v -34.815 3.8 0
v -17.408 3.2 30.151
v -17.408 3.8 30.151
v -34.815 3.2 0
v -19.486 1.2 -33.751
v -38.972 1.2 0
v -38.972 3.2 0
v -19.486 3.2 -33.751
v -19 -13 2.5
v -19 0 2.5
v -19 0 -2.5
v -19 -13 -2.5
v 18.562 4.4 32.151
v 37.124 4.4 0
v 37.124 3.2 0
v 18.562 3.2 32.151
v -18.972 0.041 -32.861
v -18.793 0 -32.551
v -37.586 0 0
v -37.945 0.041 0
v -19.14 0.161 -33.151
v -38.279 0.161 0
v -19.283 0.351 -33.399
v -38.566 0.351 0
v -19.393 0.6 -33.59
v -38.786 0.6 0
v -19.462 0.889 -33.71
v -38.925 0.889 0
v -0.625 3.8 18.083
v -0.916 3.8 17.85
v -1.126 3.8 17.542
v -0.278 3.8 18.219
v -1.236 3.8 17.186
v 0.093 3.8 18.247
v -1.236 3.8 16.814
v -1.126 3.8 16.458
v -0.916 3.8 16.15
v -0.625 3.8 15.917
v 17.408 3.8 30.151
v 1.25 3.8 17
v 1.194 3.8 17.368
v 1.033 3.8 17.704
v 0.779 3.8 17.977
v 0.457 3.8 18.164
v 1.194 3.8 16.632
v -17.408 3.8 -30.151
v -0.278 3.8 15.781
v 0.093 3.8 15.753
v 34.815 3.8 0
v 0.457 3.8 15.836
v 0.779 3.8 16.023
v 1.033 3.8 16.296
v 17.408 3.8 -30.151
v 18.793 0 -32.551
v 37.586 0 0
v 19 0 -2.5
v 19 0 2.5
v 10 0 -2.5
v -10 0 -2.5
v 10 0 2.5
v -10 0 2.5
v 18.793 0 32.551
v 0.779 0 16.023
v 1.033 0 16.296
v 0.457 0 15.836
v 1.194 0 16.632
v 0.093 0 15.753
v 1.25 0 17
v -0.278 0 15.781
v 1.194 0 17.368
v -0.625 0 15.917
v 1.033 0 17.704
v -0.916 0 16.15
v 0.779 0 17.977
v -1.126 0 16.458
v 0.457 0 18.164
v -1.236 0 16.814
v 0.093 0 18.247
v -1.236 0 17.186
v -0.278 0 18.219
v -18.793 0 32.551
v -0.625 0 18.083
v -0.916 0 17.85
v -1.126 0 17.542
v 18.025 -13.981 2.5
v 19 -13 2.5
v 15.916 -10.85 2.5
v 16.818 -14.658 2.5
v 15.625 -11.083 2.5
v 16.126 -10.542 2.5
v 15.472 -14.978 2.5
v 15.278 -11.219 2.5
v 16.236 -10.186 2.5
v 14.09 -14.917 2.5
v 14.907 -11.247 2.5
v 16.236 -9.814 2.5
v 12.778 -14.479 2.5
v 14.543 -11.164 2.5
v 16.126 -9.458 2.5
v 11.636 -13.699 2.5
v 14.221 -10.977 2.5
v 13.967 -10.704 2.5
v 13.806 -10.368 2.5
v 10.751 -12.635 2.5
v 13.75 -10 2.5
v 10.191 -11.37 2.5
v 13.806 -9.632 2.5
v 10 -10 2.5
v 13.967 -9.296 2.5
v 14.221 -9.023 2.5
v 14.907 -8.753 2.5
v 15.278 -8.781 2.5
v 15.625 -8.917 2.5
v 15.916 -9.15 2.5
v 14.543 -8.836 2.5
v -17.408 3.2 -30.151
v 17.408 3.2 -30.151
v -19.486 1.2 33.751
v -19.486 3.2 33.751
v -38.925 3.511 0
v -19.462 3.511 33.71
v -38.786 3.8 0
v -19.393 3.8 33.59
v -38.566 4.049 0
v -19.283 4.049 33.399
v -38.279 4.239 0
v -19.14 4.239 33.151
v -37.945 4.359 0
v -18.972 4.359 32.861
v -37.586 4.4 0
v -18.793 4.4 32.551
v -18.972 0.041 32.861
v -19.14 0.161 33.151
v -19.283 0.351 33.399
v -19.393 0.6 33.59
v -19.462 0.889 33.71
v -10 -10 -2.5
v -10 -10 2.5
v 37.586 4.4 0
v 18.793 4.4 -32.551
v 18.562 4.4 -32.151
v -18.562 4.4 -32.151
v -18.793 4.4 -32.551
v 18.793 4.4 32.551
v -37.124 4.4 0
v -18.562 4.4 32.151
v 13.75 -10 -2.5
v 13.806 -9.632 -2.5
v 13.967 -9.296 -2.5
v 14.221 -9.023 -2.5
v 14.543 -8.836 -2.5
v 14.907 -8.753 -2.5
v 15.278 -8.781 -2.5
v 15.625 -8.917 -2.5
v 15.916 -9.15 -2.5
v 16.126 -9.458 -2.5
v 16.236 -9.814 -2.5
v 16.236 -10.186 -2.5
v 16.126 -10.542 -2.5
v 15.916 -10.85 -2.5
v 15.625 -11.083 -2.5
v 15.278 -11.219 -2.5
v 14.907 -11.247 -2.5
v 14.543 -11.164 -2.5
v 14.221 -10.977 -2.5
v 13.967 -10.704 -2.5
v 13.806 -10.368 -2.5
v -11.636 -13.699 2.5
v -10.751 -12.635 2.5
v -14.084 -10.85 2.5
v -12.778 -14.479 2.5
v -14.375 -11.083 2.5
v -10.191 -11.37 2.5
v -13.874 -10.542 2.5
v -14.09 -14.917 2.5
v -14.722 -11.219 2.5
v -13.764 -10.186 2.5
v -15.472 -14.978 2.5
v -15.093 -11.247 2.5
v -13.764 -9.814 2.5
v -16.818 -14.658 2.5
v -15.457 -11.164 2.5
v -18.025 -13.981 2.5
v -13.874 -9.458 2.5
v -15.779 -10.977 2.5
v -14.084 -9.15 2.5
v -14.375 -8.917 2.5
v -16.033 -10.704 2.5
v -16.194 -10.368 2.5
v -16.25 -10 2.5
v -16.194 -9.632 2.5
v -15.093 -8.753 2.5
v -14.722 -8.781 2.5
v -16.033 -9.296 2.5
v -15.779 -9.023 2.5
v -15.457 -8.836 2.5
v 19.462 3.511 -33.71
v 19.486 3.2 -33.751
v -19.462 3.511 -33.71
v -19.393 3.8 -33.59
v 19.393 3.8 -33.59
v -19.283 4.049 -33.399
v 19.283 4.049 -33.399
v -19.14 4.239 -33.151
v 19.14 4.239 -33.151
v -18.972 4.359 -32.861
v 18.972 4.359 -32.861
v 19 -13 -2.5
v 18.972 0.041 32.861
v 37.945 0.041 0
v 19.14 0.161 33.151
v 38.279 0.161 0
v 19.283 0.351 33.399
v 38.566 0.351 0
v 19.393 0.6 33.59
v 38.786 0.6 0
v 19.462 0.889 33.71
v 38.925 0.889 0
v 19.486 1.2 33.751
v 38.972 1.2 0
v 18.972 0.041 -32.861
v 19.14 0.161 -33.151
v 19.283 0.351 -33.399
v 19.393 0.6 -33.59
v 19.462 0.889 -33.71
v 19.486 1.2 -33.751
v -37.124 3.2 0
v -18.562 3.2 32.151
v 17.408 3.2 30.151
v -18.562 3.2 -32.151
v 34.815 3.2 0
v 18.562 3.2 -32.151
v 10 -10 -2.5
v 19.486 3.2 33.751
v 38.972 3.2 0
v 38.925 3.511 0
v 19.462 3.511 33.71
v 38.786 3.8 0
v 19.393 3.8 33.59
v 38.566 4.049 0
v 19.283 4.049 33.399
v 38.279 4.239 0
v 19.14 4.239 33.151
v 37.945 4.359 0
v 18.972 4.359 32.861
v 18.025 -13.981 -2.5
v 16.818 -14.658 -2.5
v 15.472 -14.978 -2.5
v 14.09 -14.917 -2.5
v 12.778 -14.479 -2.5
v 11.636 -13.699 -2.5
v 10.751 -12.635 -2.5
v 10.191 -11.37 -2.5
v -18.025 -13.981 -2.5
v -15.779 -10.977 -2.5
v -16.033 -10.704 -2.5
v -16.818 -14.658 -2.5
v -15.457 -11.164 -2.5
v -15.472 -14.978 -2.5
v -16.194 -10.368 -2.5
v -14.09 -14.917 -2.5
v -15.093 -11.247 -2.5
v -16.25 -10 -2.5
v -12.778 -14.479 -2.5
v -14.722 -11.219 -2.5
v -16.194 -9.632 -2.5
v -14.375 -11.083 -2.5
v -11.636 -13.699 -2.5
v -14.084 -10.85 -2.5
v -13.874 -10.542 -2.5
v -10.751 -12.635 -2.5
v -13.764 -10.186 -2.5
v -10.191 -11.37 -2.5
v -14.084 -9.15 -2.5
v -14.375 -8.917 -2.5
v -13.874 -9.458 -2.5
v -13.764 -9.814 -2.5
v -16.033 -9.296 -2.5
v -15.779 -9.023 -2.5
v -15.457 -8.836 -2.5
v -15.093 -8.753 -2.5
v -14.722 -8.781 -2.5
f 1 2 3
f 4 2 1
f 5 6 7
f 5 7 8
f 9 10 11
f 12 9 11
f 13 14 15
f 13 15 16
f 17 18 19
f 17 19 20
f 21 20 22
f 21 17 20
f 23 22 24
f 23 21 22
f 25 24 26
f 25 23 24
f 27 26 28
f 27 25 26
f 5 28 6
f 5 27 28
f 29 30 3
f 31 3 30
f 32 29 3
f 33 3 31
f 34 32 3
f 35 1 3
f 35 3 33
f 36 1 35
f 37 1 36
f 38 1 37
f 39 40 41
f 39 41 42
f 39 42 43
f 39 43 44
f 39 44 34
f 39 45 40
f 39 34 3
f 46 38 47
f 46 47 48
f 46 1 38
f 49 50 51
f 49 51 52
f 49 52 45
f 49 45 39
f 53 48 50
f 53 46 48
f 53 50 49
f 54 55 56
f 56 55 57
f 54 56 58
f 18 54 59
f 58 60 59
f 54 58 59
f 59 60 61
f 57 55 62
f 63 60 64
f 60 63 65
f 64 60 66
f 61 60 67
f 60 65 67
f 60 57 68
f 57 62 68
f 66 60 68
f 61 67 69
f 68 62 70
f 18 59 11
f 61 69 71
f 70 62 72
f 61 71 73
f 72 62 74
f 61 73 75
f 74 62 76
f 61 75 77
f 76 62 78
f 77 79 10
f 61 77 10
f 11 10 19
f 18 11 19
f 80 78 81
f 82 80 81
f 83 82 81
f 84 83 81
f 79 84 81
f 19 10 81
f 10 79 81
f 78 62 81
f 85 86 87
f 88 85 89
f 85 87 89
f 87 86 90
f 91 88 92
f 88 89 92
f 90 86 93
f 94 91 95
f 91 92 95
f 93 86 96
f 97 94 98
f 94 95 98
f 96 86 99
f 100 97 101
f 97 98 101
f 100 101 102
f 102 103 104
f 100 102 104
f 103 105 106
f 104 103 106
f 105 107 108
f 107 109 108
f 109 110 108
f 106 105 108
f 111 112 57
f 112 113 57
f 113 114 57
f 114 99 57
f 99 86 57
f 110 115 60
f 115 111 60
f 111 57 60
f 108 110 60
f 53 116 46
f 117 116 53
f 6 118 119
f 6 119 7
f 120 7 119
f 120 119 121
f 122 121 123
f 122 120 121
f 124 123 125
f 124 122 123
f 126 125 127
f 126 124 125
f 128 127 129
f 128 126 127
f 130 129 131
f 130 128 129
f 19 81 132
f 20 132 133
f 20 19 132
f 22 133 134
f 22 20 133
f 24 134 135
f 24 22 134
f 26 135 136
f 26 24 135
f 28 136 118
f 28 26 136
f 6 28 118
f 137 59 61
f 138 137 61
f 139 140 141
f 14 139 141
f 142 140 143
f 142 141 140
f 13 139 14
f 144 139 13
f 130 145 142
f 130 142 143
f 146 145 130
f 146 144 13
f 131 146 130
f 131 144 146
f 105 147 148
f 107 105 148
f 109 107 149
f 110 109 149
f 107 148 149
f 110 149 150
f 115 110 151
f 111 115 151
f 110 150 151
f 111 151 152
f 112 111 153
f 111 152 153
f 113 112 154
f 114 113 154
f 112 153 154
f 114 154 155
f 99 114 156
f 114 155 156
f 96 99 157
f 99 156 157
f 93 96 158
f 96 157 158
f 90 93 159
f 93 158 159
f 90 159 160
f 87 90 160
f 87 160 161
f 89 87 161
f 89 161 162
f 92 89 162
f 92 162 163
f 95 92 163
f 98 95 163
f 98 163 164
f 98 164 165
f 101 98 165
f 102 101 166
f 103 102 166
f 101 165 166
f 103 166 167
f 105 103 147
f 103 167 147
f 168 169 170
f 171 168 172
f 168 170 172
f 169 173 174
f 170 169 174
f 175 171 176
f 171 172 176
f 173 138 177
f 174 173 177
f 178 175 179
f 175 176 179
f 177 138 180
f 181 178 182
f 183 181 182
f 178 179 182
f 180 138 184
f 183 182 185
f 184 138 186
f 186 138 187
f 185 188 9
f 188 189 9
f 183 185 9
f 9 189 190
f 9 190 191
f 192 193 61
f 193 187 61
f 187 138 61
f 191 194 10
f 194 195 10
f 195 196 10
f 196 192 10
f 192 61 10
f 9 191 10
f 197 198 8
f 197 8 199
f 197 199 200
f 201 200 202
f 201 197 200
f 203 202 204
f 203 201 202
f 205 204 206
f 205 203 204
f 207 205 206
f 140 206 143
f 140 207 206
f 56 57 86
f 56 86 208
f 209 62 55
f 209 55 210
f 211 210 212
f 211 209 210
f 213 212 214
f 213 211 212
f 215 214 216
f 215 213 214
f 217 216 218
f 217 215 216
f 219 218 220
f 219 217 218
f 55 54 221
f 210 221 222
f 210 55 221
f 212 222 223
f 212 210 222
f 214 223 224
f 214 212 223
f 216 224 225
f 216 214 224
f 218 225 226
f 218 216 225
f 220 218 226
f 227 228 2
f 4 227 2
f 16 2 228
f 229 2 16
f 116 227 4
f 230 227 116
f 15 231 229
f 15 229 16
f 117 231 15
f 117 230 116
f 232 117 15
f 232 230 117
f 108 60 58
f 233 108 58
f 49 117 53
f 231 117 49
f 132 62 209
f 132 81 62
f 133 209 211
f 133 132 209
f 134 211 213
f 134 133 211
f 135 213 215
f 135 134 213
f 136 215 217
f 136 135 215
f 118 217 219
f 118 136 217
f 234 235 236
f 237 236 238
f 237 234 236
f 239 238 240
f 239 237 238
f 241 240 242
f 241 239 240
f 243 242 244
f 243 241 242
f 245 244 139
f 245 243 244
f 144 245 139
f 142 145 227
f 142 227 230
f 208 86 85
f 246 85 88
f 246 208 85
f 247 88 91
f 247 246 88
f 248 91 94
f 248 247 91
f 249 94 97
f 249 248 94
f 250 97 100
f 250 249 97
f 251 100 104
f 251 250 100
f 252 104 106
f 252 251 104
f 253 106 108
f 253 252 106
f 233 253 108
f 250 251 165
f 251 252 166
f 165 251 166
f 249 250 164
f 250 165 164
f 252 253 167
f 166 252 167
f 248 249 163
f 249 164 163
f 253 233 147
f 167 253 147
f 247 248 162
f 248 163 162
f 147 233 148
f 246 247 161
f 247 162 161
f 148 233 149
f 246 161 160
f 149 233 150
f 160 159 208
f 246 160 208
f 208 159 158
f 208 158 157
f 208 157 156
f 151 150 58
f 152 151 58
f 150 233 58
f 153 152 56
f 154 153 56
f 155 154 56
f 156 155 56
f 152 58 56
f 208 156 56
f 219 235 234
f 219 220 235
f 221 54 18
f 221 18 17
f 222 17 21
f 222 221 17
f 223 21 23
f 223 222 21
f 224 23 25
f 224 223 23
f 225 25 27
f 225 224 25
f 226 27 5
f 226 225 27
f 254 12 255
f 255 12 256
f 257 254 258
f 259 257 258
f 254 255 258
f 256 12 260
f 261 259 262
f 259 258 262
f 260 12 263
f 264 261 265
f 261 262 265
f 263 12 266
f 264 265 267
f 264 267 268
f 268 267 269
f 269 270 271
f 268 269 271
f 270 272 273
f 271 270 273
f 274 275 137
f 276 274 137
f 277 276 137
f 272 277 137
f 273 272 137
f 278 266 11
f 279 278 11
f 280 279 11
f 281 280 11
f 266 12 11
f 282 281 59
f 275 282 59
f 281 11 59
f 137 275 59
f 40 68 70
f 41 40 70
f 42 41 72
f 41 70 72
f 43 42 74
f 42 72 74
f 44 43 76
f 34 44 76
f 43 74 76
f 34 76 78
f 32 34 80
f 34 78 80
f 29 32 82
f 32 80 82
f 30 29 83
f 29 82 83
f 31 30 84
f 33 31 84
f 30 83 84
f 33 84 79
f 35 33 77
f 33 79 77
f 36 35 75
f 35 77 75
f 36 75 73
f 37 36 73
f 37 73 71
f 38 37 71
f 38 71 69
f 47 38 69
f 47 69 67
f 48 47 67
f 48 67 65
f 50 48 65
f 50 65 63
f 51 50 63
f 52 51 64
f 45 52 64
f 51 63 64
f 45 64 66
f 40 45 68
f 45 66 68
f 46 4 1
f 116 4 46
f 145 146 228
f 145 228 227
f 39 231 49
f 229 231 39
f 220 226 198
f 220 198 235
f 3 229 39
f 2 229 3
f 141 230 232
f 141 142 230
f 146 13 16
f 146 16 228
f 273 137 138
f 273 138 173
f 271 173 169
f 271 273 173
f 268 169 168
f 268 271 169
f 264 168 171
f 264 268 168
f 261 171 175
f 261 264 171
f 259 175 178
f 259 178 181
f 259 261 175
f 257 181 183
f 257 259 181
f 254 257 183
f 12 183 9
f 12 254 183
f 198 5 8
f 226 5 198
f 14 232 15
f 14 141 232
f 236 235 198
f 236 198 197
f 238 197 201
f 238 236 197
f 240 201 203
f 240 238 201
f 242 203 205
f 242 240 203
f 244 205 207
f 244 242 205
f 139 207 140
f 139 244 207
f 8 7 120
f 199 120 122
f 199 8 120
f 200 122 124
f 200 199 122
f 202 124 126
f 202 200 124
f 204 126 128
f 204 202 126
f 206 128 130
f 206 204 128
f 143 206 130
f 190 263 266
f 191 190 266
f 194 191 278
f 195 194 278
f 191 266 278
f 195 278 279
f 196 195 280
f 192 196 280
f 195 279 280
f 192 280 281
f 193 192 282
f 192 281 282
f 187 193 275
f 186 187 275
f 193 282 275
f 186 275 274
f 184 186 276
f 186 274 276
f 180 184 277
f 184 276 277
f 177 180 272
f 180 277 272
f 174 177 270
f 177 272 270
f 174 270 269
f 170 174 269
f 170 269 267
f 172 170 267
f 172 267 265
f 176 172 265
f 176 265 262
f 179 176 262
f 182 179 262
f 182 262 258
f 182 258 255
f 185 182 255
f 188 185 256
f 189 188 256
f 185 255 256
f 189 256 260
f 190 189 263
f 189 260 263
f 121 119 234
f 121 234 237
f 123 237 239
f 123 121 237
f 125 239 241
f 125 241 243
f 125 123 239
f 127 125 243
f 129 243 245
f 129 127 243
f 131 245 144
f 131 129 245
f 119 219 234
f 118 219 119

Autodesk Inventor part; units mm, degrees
ref_plane "YZ Plane" through (0, 0, 0) normal (1, 0, 0) x (0, 1, 0)
ref_plane "XZ Plane" through (0, 0, 0) normal (0, 1, 0) x (-1, 0, 0)
ref_plane "XY Plane" through (0, 0, 0) normal (0, 0, 1) x (1, 0, 0)
sketch "스케치1" plane through (0, 0, 0) normal (0, 1, 0) x (-1, 0, 0)
  line L0 (17.6385, -30.5508) -> (-17.6385, -30.5508)
  line L1 (-17.6385, -30.5508) -> (-35.277, 0)
  line L2 (-35.277, 0) -> (-17.6385, 30.5508)
  line L3 (-17.6385, 30.5508) -> (17.6385, 30.5508)
  line L4 (17.6385, 30.5508) -> (35.277, 0)
  line L5 (35.277, 0) -> (17.6385, -30.5508)
  line L6 (19.486, -33.7508) -> (-19.486, -33.7508)
  line L7 (-19.486, -33.7508) -> (-38.972, 0)
  line L8 (-38.972, 0) -> (-19.486, 33.7508)
  line L9 (-19.486, 33.7508) -> (19.486, 33.7508)
  line L10 (19.486, 33.7508) -> (38.972, 0)
  line L11 (38.972, 0) -> (19.486, -33.7508)
  point P0 (0, 0)
  point P1 (0, 0)
  point P2 (0, 0)
  dimension "d0" = 70.554
  dimension "d1" = 3.2
extrude "돌출1" add sketch "스케치1" along normal blind 4.4 contours L0 L1 L2 L3 L4 L5 | L6 L7 L8 L9 L10 L11
sketch "스케치2" plane through (0, 4.4, 0) normal (0, 1, 0) x (1, 0, 0)
  line L0 (-18.5623, 32.1508) -> (18.5623, 32.1508)
  line L1 (18.5623, 32.1508) -> (37.1245, 0)
  line L2 (37.1245, 0) -> (18.5623, -32.1508)
  line L3 (18.5623, -32.1508) -> (-18.5623, -32.1508)
  line L4 (-18.5623, -32.1508) -> (-37.1245, 0)
  line L5 (-37.1245, 0) -> (-18.5623, 32.1508)
  line L6 (-19.486, 33.7508) -> (-38.972, 0) projected
  point P0 (0, 0)
  point P1 (0, 0)
  dimension "d4" = 1.6
extrude "돌출2" cut sketch "스케치2" against normal blind 1.2
sketch "스케치3" plane through (0, 3.2, 0) normal (0, 1, 0) x (1, 0, 0)
  line L0 (17.4076, -30.1508) -> (-17.4076, -30.1508)
  line L1 (-17.4076, -30.1508) -> (-34.8151, 0)
  line L2 (-34.8151, 0) -> (-17.4076, 30.1508)
  line L3 (-17.4076, 30.1508) -> (17.4076, 30.1508)
  line L4 (17.4076, 30.1508) -> (34.8151, 0)
  line L5 (34.8151, 0) -> (17.4076, -30.1508)
  line L6 (-18.5623, 32.1508) -> (18.5623, 32.1508) projected
  point P0 (0, 0)
  point P1 (0, 0)
  dimension "d7" = 2
extrude "돌출3" add sketch "스케치3" along normal blind 0.6
fillet "모깎기1" radius 1.2 12 edges at (0, 4.4, -33.7508) (0, 0, -33.7508) (-29.229, 4.4, -16.8754) (-29.229, 0, -16.8754) (-29.229, 4.4, 16.8754) (-29.229, 0, 16.8754) (0, 0, 33.7508) (0, 4.4, 33.7508) (29.229, 0, 16.8754) (29.229, 4.4, 16.8754) (29.229, 4.4, -16.8754) (29.229, 0, -16.8754)
sketch "스케치6" plane through (0, 0, 0) normal (0, -1, 0) x (1, 0, 0)
  line L0 (-20, -2.5) -> (-10, -2.5)
  line L1 (-10, -2.5) -> (-10, 2.5)
  line L2 (-10, 2.5) -> (-20, 2.5)
  line L3 (-20, 2.5) -> (-20, -2.5)
  line L4 (-20, -2.5) -> (-10, 2.5) construction
  line L5 (-10, -2.5) -> (-20, 2.5) construction
  line L6 (10, -2.5) -> (20, -2.5)
  line L7 (20, -2.5) -> (20, 2.5)
  line L8 (20, 2.5) -> (10, 2.5)
  line L9 (10, 2.5) -> (10, -2.5)
  line L10 (10, -2.5) -> (20, 2.5) construction
  line L11 (20, -2.5) -> (10, 2.5) construction
  point P0 (0, 0)
  point P1 (-15, 0)
  point P2 (15, 0)
  point P3 (-10, 0)
  point P4 (10, 0)
  dimension "d27" = 10
  dimension "d28" = 5
  dimension "d29" = 10
  dimension "d30" = 5
  dimension "d31" = 20
  dimension "d32" = 10
extrude "돌출6" add sketch "스케치6" along normal blind 10
sketch "스케치7" plane through (-10, 0, -2.5) normal (0, 0, -1) x (-1, 0, 0)
  line L0 (10, -10) -> (0, -10) projected
  circle A0 centre (5, -10) radius 5
  line L1 (-30, -10) -> (-20, -10) projected
  circle A1 centre (-25, -10) radius 5
  point P0 (-10, 0)
extrude "돌출7" add sketch "스케치7" against normal blind 5
sketch "스케치8" plane through (-10, 0, -2.5) normal (0, 0, -1) x (-1, 0, 0)
  arc A0 (0, -10) -> (10, -10) centre (5, -10) ccw projected
  circle A1 centre (5, -10) radius 1.25
  arc A2 (-30, -10) -> (-20, -10) centre (-25, -10) ccw projected
  circle A3 centre (-25, -10) radius 1.25
  point P0 (-10, 0)
  dimension "d37" = 2.5
  dimension "d38" = 2.5
extrude "돌출8" cut sketch "스케치8" against normal blind 5
sketch "스케치9" plane through (0, 0, 0) normal (0, -1, 0) x (1, 0, 0)
  line L0 (-20, 2.5) -> (-20, -2.5) projected
  line L1 (-10, -2.5) -> (-20, -2.5) projected
  line L2 (-10, -2.5) -> (-10, 2.5) projected
  line L3 (-20, 2.5) -> (-10, 2.5) projected
  line L4 (10, 2.5) -> (10, -2.5) projected
  line L5 (20, -2.5) -> (10, -2.5) projected
  line L6 (20, -2.5) -> (20, 2.5) projected
  line L7 (10, 2.5) -> (20, 2.5) projected
  line L8 (-19, 2.5) -> (-19, -2.5)
  line L9 (19, 2.5) -> (19, -2.5)
  point P0 (0, 0)
  dimension "d41" = 1
  dimension "d42" = 1
extrude "돌출9" cut sketch "스케치9" along normal blind 15 contours L3 L8 L1 L0 | L7 L6 L5 L9
sketch "스케치10" plane through (0, 0, 0) normal (0, -1, 0) x (1, 0, 0)
  circle A0 centre (0, 17) radius 1.25
  point P0 (0, 0)
  dimension "d45" = 2.5
  dimension "d46" = 17
extrude "돌출10" cut sketch "스케치10" against normal up to surface (3.8 mm away)
equation "\"d32\" = 0.5 * d31"
properties part number "OV-PAM_n_6_bottom"
